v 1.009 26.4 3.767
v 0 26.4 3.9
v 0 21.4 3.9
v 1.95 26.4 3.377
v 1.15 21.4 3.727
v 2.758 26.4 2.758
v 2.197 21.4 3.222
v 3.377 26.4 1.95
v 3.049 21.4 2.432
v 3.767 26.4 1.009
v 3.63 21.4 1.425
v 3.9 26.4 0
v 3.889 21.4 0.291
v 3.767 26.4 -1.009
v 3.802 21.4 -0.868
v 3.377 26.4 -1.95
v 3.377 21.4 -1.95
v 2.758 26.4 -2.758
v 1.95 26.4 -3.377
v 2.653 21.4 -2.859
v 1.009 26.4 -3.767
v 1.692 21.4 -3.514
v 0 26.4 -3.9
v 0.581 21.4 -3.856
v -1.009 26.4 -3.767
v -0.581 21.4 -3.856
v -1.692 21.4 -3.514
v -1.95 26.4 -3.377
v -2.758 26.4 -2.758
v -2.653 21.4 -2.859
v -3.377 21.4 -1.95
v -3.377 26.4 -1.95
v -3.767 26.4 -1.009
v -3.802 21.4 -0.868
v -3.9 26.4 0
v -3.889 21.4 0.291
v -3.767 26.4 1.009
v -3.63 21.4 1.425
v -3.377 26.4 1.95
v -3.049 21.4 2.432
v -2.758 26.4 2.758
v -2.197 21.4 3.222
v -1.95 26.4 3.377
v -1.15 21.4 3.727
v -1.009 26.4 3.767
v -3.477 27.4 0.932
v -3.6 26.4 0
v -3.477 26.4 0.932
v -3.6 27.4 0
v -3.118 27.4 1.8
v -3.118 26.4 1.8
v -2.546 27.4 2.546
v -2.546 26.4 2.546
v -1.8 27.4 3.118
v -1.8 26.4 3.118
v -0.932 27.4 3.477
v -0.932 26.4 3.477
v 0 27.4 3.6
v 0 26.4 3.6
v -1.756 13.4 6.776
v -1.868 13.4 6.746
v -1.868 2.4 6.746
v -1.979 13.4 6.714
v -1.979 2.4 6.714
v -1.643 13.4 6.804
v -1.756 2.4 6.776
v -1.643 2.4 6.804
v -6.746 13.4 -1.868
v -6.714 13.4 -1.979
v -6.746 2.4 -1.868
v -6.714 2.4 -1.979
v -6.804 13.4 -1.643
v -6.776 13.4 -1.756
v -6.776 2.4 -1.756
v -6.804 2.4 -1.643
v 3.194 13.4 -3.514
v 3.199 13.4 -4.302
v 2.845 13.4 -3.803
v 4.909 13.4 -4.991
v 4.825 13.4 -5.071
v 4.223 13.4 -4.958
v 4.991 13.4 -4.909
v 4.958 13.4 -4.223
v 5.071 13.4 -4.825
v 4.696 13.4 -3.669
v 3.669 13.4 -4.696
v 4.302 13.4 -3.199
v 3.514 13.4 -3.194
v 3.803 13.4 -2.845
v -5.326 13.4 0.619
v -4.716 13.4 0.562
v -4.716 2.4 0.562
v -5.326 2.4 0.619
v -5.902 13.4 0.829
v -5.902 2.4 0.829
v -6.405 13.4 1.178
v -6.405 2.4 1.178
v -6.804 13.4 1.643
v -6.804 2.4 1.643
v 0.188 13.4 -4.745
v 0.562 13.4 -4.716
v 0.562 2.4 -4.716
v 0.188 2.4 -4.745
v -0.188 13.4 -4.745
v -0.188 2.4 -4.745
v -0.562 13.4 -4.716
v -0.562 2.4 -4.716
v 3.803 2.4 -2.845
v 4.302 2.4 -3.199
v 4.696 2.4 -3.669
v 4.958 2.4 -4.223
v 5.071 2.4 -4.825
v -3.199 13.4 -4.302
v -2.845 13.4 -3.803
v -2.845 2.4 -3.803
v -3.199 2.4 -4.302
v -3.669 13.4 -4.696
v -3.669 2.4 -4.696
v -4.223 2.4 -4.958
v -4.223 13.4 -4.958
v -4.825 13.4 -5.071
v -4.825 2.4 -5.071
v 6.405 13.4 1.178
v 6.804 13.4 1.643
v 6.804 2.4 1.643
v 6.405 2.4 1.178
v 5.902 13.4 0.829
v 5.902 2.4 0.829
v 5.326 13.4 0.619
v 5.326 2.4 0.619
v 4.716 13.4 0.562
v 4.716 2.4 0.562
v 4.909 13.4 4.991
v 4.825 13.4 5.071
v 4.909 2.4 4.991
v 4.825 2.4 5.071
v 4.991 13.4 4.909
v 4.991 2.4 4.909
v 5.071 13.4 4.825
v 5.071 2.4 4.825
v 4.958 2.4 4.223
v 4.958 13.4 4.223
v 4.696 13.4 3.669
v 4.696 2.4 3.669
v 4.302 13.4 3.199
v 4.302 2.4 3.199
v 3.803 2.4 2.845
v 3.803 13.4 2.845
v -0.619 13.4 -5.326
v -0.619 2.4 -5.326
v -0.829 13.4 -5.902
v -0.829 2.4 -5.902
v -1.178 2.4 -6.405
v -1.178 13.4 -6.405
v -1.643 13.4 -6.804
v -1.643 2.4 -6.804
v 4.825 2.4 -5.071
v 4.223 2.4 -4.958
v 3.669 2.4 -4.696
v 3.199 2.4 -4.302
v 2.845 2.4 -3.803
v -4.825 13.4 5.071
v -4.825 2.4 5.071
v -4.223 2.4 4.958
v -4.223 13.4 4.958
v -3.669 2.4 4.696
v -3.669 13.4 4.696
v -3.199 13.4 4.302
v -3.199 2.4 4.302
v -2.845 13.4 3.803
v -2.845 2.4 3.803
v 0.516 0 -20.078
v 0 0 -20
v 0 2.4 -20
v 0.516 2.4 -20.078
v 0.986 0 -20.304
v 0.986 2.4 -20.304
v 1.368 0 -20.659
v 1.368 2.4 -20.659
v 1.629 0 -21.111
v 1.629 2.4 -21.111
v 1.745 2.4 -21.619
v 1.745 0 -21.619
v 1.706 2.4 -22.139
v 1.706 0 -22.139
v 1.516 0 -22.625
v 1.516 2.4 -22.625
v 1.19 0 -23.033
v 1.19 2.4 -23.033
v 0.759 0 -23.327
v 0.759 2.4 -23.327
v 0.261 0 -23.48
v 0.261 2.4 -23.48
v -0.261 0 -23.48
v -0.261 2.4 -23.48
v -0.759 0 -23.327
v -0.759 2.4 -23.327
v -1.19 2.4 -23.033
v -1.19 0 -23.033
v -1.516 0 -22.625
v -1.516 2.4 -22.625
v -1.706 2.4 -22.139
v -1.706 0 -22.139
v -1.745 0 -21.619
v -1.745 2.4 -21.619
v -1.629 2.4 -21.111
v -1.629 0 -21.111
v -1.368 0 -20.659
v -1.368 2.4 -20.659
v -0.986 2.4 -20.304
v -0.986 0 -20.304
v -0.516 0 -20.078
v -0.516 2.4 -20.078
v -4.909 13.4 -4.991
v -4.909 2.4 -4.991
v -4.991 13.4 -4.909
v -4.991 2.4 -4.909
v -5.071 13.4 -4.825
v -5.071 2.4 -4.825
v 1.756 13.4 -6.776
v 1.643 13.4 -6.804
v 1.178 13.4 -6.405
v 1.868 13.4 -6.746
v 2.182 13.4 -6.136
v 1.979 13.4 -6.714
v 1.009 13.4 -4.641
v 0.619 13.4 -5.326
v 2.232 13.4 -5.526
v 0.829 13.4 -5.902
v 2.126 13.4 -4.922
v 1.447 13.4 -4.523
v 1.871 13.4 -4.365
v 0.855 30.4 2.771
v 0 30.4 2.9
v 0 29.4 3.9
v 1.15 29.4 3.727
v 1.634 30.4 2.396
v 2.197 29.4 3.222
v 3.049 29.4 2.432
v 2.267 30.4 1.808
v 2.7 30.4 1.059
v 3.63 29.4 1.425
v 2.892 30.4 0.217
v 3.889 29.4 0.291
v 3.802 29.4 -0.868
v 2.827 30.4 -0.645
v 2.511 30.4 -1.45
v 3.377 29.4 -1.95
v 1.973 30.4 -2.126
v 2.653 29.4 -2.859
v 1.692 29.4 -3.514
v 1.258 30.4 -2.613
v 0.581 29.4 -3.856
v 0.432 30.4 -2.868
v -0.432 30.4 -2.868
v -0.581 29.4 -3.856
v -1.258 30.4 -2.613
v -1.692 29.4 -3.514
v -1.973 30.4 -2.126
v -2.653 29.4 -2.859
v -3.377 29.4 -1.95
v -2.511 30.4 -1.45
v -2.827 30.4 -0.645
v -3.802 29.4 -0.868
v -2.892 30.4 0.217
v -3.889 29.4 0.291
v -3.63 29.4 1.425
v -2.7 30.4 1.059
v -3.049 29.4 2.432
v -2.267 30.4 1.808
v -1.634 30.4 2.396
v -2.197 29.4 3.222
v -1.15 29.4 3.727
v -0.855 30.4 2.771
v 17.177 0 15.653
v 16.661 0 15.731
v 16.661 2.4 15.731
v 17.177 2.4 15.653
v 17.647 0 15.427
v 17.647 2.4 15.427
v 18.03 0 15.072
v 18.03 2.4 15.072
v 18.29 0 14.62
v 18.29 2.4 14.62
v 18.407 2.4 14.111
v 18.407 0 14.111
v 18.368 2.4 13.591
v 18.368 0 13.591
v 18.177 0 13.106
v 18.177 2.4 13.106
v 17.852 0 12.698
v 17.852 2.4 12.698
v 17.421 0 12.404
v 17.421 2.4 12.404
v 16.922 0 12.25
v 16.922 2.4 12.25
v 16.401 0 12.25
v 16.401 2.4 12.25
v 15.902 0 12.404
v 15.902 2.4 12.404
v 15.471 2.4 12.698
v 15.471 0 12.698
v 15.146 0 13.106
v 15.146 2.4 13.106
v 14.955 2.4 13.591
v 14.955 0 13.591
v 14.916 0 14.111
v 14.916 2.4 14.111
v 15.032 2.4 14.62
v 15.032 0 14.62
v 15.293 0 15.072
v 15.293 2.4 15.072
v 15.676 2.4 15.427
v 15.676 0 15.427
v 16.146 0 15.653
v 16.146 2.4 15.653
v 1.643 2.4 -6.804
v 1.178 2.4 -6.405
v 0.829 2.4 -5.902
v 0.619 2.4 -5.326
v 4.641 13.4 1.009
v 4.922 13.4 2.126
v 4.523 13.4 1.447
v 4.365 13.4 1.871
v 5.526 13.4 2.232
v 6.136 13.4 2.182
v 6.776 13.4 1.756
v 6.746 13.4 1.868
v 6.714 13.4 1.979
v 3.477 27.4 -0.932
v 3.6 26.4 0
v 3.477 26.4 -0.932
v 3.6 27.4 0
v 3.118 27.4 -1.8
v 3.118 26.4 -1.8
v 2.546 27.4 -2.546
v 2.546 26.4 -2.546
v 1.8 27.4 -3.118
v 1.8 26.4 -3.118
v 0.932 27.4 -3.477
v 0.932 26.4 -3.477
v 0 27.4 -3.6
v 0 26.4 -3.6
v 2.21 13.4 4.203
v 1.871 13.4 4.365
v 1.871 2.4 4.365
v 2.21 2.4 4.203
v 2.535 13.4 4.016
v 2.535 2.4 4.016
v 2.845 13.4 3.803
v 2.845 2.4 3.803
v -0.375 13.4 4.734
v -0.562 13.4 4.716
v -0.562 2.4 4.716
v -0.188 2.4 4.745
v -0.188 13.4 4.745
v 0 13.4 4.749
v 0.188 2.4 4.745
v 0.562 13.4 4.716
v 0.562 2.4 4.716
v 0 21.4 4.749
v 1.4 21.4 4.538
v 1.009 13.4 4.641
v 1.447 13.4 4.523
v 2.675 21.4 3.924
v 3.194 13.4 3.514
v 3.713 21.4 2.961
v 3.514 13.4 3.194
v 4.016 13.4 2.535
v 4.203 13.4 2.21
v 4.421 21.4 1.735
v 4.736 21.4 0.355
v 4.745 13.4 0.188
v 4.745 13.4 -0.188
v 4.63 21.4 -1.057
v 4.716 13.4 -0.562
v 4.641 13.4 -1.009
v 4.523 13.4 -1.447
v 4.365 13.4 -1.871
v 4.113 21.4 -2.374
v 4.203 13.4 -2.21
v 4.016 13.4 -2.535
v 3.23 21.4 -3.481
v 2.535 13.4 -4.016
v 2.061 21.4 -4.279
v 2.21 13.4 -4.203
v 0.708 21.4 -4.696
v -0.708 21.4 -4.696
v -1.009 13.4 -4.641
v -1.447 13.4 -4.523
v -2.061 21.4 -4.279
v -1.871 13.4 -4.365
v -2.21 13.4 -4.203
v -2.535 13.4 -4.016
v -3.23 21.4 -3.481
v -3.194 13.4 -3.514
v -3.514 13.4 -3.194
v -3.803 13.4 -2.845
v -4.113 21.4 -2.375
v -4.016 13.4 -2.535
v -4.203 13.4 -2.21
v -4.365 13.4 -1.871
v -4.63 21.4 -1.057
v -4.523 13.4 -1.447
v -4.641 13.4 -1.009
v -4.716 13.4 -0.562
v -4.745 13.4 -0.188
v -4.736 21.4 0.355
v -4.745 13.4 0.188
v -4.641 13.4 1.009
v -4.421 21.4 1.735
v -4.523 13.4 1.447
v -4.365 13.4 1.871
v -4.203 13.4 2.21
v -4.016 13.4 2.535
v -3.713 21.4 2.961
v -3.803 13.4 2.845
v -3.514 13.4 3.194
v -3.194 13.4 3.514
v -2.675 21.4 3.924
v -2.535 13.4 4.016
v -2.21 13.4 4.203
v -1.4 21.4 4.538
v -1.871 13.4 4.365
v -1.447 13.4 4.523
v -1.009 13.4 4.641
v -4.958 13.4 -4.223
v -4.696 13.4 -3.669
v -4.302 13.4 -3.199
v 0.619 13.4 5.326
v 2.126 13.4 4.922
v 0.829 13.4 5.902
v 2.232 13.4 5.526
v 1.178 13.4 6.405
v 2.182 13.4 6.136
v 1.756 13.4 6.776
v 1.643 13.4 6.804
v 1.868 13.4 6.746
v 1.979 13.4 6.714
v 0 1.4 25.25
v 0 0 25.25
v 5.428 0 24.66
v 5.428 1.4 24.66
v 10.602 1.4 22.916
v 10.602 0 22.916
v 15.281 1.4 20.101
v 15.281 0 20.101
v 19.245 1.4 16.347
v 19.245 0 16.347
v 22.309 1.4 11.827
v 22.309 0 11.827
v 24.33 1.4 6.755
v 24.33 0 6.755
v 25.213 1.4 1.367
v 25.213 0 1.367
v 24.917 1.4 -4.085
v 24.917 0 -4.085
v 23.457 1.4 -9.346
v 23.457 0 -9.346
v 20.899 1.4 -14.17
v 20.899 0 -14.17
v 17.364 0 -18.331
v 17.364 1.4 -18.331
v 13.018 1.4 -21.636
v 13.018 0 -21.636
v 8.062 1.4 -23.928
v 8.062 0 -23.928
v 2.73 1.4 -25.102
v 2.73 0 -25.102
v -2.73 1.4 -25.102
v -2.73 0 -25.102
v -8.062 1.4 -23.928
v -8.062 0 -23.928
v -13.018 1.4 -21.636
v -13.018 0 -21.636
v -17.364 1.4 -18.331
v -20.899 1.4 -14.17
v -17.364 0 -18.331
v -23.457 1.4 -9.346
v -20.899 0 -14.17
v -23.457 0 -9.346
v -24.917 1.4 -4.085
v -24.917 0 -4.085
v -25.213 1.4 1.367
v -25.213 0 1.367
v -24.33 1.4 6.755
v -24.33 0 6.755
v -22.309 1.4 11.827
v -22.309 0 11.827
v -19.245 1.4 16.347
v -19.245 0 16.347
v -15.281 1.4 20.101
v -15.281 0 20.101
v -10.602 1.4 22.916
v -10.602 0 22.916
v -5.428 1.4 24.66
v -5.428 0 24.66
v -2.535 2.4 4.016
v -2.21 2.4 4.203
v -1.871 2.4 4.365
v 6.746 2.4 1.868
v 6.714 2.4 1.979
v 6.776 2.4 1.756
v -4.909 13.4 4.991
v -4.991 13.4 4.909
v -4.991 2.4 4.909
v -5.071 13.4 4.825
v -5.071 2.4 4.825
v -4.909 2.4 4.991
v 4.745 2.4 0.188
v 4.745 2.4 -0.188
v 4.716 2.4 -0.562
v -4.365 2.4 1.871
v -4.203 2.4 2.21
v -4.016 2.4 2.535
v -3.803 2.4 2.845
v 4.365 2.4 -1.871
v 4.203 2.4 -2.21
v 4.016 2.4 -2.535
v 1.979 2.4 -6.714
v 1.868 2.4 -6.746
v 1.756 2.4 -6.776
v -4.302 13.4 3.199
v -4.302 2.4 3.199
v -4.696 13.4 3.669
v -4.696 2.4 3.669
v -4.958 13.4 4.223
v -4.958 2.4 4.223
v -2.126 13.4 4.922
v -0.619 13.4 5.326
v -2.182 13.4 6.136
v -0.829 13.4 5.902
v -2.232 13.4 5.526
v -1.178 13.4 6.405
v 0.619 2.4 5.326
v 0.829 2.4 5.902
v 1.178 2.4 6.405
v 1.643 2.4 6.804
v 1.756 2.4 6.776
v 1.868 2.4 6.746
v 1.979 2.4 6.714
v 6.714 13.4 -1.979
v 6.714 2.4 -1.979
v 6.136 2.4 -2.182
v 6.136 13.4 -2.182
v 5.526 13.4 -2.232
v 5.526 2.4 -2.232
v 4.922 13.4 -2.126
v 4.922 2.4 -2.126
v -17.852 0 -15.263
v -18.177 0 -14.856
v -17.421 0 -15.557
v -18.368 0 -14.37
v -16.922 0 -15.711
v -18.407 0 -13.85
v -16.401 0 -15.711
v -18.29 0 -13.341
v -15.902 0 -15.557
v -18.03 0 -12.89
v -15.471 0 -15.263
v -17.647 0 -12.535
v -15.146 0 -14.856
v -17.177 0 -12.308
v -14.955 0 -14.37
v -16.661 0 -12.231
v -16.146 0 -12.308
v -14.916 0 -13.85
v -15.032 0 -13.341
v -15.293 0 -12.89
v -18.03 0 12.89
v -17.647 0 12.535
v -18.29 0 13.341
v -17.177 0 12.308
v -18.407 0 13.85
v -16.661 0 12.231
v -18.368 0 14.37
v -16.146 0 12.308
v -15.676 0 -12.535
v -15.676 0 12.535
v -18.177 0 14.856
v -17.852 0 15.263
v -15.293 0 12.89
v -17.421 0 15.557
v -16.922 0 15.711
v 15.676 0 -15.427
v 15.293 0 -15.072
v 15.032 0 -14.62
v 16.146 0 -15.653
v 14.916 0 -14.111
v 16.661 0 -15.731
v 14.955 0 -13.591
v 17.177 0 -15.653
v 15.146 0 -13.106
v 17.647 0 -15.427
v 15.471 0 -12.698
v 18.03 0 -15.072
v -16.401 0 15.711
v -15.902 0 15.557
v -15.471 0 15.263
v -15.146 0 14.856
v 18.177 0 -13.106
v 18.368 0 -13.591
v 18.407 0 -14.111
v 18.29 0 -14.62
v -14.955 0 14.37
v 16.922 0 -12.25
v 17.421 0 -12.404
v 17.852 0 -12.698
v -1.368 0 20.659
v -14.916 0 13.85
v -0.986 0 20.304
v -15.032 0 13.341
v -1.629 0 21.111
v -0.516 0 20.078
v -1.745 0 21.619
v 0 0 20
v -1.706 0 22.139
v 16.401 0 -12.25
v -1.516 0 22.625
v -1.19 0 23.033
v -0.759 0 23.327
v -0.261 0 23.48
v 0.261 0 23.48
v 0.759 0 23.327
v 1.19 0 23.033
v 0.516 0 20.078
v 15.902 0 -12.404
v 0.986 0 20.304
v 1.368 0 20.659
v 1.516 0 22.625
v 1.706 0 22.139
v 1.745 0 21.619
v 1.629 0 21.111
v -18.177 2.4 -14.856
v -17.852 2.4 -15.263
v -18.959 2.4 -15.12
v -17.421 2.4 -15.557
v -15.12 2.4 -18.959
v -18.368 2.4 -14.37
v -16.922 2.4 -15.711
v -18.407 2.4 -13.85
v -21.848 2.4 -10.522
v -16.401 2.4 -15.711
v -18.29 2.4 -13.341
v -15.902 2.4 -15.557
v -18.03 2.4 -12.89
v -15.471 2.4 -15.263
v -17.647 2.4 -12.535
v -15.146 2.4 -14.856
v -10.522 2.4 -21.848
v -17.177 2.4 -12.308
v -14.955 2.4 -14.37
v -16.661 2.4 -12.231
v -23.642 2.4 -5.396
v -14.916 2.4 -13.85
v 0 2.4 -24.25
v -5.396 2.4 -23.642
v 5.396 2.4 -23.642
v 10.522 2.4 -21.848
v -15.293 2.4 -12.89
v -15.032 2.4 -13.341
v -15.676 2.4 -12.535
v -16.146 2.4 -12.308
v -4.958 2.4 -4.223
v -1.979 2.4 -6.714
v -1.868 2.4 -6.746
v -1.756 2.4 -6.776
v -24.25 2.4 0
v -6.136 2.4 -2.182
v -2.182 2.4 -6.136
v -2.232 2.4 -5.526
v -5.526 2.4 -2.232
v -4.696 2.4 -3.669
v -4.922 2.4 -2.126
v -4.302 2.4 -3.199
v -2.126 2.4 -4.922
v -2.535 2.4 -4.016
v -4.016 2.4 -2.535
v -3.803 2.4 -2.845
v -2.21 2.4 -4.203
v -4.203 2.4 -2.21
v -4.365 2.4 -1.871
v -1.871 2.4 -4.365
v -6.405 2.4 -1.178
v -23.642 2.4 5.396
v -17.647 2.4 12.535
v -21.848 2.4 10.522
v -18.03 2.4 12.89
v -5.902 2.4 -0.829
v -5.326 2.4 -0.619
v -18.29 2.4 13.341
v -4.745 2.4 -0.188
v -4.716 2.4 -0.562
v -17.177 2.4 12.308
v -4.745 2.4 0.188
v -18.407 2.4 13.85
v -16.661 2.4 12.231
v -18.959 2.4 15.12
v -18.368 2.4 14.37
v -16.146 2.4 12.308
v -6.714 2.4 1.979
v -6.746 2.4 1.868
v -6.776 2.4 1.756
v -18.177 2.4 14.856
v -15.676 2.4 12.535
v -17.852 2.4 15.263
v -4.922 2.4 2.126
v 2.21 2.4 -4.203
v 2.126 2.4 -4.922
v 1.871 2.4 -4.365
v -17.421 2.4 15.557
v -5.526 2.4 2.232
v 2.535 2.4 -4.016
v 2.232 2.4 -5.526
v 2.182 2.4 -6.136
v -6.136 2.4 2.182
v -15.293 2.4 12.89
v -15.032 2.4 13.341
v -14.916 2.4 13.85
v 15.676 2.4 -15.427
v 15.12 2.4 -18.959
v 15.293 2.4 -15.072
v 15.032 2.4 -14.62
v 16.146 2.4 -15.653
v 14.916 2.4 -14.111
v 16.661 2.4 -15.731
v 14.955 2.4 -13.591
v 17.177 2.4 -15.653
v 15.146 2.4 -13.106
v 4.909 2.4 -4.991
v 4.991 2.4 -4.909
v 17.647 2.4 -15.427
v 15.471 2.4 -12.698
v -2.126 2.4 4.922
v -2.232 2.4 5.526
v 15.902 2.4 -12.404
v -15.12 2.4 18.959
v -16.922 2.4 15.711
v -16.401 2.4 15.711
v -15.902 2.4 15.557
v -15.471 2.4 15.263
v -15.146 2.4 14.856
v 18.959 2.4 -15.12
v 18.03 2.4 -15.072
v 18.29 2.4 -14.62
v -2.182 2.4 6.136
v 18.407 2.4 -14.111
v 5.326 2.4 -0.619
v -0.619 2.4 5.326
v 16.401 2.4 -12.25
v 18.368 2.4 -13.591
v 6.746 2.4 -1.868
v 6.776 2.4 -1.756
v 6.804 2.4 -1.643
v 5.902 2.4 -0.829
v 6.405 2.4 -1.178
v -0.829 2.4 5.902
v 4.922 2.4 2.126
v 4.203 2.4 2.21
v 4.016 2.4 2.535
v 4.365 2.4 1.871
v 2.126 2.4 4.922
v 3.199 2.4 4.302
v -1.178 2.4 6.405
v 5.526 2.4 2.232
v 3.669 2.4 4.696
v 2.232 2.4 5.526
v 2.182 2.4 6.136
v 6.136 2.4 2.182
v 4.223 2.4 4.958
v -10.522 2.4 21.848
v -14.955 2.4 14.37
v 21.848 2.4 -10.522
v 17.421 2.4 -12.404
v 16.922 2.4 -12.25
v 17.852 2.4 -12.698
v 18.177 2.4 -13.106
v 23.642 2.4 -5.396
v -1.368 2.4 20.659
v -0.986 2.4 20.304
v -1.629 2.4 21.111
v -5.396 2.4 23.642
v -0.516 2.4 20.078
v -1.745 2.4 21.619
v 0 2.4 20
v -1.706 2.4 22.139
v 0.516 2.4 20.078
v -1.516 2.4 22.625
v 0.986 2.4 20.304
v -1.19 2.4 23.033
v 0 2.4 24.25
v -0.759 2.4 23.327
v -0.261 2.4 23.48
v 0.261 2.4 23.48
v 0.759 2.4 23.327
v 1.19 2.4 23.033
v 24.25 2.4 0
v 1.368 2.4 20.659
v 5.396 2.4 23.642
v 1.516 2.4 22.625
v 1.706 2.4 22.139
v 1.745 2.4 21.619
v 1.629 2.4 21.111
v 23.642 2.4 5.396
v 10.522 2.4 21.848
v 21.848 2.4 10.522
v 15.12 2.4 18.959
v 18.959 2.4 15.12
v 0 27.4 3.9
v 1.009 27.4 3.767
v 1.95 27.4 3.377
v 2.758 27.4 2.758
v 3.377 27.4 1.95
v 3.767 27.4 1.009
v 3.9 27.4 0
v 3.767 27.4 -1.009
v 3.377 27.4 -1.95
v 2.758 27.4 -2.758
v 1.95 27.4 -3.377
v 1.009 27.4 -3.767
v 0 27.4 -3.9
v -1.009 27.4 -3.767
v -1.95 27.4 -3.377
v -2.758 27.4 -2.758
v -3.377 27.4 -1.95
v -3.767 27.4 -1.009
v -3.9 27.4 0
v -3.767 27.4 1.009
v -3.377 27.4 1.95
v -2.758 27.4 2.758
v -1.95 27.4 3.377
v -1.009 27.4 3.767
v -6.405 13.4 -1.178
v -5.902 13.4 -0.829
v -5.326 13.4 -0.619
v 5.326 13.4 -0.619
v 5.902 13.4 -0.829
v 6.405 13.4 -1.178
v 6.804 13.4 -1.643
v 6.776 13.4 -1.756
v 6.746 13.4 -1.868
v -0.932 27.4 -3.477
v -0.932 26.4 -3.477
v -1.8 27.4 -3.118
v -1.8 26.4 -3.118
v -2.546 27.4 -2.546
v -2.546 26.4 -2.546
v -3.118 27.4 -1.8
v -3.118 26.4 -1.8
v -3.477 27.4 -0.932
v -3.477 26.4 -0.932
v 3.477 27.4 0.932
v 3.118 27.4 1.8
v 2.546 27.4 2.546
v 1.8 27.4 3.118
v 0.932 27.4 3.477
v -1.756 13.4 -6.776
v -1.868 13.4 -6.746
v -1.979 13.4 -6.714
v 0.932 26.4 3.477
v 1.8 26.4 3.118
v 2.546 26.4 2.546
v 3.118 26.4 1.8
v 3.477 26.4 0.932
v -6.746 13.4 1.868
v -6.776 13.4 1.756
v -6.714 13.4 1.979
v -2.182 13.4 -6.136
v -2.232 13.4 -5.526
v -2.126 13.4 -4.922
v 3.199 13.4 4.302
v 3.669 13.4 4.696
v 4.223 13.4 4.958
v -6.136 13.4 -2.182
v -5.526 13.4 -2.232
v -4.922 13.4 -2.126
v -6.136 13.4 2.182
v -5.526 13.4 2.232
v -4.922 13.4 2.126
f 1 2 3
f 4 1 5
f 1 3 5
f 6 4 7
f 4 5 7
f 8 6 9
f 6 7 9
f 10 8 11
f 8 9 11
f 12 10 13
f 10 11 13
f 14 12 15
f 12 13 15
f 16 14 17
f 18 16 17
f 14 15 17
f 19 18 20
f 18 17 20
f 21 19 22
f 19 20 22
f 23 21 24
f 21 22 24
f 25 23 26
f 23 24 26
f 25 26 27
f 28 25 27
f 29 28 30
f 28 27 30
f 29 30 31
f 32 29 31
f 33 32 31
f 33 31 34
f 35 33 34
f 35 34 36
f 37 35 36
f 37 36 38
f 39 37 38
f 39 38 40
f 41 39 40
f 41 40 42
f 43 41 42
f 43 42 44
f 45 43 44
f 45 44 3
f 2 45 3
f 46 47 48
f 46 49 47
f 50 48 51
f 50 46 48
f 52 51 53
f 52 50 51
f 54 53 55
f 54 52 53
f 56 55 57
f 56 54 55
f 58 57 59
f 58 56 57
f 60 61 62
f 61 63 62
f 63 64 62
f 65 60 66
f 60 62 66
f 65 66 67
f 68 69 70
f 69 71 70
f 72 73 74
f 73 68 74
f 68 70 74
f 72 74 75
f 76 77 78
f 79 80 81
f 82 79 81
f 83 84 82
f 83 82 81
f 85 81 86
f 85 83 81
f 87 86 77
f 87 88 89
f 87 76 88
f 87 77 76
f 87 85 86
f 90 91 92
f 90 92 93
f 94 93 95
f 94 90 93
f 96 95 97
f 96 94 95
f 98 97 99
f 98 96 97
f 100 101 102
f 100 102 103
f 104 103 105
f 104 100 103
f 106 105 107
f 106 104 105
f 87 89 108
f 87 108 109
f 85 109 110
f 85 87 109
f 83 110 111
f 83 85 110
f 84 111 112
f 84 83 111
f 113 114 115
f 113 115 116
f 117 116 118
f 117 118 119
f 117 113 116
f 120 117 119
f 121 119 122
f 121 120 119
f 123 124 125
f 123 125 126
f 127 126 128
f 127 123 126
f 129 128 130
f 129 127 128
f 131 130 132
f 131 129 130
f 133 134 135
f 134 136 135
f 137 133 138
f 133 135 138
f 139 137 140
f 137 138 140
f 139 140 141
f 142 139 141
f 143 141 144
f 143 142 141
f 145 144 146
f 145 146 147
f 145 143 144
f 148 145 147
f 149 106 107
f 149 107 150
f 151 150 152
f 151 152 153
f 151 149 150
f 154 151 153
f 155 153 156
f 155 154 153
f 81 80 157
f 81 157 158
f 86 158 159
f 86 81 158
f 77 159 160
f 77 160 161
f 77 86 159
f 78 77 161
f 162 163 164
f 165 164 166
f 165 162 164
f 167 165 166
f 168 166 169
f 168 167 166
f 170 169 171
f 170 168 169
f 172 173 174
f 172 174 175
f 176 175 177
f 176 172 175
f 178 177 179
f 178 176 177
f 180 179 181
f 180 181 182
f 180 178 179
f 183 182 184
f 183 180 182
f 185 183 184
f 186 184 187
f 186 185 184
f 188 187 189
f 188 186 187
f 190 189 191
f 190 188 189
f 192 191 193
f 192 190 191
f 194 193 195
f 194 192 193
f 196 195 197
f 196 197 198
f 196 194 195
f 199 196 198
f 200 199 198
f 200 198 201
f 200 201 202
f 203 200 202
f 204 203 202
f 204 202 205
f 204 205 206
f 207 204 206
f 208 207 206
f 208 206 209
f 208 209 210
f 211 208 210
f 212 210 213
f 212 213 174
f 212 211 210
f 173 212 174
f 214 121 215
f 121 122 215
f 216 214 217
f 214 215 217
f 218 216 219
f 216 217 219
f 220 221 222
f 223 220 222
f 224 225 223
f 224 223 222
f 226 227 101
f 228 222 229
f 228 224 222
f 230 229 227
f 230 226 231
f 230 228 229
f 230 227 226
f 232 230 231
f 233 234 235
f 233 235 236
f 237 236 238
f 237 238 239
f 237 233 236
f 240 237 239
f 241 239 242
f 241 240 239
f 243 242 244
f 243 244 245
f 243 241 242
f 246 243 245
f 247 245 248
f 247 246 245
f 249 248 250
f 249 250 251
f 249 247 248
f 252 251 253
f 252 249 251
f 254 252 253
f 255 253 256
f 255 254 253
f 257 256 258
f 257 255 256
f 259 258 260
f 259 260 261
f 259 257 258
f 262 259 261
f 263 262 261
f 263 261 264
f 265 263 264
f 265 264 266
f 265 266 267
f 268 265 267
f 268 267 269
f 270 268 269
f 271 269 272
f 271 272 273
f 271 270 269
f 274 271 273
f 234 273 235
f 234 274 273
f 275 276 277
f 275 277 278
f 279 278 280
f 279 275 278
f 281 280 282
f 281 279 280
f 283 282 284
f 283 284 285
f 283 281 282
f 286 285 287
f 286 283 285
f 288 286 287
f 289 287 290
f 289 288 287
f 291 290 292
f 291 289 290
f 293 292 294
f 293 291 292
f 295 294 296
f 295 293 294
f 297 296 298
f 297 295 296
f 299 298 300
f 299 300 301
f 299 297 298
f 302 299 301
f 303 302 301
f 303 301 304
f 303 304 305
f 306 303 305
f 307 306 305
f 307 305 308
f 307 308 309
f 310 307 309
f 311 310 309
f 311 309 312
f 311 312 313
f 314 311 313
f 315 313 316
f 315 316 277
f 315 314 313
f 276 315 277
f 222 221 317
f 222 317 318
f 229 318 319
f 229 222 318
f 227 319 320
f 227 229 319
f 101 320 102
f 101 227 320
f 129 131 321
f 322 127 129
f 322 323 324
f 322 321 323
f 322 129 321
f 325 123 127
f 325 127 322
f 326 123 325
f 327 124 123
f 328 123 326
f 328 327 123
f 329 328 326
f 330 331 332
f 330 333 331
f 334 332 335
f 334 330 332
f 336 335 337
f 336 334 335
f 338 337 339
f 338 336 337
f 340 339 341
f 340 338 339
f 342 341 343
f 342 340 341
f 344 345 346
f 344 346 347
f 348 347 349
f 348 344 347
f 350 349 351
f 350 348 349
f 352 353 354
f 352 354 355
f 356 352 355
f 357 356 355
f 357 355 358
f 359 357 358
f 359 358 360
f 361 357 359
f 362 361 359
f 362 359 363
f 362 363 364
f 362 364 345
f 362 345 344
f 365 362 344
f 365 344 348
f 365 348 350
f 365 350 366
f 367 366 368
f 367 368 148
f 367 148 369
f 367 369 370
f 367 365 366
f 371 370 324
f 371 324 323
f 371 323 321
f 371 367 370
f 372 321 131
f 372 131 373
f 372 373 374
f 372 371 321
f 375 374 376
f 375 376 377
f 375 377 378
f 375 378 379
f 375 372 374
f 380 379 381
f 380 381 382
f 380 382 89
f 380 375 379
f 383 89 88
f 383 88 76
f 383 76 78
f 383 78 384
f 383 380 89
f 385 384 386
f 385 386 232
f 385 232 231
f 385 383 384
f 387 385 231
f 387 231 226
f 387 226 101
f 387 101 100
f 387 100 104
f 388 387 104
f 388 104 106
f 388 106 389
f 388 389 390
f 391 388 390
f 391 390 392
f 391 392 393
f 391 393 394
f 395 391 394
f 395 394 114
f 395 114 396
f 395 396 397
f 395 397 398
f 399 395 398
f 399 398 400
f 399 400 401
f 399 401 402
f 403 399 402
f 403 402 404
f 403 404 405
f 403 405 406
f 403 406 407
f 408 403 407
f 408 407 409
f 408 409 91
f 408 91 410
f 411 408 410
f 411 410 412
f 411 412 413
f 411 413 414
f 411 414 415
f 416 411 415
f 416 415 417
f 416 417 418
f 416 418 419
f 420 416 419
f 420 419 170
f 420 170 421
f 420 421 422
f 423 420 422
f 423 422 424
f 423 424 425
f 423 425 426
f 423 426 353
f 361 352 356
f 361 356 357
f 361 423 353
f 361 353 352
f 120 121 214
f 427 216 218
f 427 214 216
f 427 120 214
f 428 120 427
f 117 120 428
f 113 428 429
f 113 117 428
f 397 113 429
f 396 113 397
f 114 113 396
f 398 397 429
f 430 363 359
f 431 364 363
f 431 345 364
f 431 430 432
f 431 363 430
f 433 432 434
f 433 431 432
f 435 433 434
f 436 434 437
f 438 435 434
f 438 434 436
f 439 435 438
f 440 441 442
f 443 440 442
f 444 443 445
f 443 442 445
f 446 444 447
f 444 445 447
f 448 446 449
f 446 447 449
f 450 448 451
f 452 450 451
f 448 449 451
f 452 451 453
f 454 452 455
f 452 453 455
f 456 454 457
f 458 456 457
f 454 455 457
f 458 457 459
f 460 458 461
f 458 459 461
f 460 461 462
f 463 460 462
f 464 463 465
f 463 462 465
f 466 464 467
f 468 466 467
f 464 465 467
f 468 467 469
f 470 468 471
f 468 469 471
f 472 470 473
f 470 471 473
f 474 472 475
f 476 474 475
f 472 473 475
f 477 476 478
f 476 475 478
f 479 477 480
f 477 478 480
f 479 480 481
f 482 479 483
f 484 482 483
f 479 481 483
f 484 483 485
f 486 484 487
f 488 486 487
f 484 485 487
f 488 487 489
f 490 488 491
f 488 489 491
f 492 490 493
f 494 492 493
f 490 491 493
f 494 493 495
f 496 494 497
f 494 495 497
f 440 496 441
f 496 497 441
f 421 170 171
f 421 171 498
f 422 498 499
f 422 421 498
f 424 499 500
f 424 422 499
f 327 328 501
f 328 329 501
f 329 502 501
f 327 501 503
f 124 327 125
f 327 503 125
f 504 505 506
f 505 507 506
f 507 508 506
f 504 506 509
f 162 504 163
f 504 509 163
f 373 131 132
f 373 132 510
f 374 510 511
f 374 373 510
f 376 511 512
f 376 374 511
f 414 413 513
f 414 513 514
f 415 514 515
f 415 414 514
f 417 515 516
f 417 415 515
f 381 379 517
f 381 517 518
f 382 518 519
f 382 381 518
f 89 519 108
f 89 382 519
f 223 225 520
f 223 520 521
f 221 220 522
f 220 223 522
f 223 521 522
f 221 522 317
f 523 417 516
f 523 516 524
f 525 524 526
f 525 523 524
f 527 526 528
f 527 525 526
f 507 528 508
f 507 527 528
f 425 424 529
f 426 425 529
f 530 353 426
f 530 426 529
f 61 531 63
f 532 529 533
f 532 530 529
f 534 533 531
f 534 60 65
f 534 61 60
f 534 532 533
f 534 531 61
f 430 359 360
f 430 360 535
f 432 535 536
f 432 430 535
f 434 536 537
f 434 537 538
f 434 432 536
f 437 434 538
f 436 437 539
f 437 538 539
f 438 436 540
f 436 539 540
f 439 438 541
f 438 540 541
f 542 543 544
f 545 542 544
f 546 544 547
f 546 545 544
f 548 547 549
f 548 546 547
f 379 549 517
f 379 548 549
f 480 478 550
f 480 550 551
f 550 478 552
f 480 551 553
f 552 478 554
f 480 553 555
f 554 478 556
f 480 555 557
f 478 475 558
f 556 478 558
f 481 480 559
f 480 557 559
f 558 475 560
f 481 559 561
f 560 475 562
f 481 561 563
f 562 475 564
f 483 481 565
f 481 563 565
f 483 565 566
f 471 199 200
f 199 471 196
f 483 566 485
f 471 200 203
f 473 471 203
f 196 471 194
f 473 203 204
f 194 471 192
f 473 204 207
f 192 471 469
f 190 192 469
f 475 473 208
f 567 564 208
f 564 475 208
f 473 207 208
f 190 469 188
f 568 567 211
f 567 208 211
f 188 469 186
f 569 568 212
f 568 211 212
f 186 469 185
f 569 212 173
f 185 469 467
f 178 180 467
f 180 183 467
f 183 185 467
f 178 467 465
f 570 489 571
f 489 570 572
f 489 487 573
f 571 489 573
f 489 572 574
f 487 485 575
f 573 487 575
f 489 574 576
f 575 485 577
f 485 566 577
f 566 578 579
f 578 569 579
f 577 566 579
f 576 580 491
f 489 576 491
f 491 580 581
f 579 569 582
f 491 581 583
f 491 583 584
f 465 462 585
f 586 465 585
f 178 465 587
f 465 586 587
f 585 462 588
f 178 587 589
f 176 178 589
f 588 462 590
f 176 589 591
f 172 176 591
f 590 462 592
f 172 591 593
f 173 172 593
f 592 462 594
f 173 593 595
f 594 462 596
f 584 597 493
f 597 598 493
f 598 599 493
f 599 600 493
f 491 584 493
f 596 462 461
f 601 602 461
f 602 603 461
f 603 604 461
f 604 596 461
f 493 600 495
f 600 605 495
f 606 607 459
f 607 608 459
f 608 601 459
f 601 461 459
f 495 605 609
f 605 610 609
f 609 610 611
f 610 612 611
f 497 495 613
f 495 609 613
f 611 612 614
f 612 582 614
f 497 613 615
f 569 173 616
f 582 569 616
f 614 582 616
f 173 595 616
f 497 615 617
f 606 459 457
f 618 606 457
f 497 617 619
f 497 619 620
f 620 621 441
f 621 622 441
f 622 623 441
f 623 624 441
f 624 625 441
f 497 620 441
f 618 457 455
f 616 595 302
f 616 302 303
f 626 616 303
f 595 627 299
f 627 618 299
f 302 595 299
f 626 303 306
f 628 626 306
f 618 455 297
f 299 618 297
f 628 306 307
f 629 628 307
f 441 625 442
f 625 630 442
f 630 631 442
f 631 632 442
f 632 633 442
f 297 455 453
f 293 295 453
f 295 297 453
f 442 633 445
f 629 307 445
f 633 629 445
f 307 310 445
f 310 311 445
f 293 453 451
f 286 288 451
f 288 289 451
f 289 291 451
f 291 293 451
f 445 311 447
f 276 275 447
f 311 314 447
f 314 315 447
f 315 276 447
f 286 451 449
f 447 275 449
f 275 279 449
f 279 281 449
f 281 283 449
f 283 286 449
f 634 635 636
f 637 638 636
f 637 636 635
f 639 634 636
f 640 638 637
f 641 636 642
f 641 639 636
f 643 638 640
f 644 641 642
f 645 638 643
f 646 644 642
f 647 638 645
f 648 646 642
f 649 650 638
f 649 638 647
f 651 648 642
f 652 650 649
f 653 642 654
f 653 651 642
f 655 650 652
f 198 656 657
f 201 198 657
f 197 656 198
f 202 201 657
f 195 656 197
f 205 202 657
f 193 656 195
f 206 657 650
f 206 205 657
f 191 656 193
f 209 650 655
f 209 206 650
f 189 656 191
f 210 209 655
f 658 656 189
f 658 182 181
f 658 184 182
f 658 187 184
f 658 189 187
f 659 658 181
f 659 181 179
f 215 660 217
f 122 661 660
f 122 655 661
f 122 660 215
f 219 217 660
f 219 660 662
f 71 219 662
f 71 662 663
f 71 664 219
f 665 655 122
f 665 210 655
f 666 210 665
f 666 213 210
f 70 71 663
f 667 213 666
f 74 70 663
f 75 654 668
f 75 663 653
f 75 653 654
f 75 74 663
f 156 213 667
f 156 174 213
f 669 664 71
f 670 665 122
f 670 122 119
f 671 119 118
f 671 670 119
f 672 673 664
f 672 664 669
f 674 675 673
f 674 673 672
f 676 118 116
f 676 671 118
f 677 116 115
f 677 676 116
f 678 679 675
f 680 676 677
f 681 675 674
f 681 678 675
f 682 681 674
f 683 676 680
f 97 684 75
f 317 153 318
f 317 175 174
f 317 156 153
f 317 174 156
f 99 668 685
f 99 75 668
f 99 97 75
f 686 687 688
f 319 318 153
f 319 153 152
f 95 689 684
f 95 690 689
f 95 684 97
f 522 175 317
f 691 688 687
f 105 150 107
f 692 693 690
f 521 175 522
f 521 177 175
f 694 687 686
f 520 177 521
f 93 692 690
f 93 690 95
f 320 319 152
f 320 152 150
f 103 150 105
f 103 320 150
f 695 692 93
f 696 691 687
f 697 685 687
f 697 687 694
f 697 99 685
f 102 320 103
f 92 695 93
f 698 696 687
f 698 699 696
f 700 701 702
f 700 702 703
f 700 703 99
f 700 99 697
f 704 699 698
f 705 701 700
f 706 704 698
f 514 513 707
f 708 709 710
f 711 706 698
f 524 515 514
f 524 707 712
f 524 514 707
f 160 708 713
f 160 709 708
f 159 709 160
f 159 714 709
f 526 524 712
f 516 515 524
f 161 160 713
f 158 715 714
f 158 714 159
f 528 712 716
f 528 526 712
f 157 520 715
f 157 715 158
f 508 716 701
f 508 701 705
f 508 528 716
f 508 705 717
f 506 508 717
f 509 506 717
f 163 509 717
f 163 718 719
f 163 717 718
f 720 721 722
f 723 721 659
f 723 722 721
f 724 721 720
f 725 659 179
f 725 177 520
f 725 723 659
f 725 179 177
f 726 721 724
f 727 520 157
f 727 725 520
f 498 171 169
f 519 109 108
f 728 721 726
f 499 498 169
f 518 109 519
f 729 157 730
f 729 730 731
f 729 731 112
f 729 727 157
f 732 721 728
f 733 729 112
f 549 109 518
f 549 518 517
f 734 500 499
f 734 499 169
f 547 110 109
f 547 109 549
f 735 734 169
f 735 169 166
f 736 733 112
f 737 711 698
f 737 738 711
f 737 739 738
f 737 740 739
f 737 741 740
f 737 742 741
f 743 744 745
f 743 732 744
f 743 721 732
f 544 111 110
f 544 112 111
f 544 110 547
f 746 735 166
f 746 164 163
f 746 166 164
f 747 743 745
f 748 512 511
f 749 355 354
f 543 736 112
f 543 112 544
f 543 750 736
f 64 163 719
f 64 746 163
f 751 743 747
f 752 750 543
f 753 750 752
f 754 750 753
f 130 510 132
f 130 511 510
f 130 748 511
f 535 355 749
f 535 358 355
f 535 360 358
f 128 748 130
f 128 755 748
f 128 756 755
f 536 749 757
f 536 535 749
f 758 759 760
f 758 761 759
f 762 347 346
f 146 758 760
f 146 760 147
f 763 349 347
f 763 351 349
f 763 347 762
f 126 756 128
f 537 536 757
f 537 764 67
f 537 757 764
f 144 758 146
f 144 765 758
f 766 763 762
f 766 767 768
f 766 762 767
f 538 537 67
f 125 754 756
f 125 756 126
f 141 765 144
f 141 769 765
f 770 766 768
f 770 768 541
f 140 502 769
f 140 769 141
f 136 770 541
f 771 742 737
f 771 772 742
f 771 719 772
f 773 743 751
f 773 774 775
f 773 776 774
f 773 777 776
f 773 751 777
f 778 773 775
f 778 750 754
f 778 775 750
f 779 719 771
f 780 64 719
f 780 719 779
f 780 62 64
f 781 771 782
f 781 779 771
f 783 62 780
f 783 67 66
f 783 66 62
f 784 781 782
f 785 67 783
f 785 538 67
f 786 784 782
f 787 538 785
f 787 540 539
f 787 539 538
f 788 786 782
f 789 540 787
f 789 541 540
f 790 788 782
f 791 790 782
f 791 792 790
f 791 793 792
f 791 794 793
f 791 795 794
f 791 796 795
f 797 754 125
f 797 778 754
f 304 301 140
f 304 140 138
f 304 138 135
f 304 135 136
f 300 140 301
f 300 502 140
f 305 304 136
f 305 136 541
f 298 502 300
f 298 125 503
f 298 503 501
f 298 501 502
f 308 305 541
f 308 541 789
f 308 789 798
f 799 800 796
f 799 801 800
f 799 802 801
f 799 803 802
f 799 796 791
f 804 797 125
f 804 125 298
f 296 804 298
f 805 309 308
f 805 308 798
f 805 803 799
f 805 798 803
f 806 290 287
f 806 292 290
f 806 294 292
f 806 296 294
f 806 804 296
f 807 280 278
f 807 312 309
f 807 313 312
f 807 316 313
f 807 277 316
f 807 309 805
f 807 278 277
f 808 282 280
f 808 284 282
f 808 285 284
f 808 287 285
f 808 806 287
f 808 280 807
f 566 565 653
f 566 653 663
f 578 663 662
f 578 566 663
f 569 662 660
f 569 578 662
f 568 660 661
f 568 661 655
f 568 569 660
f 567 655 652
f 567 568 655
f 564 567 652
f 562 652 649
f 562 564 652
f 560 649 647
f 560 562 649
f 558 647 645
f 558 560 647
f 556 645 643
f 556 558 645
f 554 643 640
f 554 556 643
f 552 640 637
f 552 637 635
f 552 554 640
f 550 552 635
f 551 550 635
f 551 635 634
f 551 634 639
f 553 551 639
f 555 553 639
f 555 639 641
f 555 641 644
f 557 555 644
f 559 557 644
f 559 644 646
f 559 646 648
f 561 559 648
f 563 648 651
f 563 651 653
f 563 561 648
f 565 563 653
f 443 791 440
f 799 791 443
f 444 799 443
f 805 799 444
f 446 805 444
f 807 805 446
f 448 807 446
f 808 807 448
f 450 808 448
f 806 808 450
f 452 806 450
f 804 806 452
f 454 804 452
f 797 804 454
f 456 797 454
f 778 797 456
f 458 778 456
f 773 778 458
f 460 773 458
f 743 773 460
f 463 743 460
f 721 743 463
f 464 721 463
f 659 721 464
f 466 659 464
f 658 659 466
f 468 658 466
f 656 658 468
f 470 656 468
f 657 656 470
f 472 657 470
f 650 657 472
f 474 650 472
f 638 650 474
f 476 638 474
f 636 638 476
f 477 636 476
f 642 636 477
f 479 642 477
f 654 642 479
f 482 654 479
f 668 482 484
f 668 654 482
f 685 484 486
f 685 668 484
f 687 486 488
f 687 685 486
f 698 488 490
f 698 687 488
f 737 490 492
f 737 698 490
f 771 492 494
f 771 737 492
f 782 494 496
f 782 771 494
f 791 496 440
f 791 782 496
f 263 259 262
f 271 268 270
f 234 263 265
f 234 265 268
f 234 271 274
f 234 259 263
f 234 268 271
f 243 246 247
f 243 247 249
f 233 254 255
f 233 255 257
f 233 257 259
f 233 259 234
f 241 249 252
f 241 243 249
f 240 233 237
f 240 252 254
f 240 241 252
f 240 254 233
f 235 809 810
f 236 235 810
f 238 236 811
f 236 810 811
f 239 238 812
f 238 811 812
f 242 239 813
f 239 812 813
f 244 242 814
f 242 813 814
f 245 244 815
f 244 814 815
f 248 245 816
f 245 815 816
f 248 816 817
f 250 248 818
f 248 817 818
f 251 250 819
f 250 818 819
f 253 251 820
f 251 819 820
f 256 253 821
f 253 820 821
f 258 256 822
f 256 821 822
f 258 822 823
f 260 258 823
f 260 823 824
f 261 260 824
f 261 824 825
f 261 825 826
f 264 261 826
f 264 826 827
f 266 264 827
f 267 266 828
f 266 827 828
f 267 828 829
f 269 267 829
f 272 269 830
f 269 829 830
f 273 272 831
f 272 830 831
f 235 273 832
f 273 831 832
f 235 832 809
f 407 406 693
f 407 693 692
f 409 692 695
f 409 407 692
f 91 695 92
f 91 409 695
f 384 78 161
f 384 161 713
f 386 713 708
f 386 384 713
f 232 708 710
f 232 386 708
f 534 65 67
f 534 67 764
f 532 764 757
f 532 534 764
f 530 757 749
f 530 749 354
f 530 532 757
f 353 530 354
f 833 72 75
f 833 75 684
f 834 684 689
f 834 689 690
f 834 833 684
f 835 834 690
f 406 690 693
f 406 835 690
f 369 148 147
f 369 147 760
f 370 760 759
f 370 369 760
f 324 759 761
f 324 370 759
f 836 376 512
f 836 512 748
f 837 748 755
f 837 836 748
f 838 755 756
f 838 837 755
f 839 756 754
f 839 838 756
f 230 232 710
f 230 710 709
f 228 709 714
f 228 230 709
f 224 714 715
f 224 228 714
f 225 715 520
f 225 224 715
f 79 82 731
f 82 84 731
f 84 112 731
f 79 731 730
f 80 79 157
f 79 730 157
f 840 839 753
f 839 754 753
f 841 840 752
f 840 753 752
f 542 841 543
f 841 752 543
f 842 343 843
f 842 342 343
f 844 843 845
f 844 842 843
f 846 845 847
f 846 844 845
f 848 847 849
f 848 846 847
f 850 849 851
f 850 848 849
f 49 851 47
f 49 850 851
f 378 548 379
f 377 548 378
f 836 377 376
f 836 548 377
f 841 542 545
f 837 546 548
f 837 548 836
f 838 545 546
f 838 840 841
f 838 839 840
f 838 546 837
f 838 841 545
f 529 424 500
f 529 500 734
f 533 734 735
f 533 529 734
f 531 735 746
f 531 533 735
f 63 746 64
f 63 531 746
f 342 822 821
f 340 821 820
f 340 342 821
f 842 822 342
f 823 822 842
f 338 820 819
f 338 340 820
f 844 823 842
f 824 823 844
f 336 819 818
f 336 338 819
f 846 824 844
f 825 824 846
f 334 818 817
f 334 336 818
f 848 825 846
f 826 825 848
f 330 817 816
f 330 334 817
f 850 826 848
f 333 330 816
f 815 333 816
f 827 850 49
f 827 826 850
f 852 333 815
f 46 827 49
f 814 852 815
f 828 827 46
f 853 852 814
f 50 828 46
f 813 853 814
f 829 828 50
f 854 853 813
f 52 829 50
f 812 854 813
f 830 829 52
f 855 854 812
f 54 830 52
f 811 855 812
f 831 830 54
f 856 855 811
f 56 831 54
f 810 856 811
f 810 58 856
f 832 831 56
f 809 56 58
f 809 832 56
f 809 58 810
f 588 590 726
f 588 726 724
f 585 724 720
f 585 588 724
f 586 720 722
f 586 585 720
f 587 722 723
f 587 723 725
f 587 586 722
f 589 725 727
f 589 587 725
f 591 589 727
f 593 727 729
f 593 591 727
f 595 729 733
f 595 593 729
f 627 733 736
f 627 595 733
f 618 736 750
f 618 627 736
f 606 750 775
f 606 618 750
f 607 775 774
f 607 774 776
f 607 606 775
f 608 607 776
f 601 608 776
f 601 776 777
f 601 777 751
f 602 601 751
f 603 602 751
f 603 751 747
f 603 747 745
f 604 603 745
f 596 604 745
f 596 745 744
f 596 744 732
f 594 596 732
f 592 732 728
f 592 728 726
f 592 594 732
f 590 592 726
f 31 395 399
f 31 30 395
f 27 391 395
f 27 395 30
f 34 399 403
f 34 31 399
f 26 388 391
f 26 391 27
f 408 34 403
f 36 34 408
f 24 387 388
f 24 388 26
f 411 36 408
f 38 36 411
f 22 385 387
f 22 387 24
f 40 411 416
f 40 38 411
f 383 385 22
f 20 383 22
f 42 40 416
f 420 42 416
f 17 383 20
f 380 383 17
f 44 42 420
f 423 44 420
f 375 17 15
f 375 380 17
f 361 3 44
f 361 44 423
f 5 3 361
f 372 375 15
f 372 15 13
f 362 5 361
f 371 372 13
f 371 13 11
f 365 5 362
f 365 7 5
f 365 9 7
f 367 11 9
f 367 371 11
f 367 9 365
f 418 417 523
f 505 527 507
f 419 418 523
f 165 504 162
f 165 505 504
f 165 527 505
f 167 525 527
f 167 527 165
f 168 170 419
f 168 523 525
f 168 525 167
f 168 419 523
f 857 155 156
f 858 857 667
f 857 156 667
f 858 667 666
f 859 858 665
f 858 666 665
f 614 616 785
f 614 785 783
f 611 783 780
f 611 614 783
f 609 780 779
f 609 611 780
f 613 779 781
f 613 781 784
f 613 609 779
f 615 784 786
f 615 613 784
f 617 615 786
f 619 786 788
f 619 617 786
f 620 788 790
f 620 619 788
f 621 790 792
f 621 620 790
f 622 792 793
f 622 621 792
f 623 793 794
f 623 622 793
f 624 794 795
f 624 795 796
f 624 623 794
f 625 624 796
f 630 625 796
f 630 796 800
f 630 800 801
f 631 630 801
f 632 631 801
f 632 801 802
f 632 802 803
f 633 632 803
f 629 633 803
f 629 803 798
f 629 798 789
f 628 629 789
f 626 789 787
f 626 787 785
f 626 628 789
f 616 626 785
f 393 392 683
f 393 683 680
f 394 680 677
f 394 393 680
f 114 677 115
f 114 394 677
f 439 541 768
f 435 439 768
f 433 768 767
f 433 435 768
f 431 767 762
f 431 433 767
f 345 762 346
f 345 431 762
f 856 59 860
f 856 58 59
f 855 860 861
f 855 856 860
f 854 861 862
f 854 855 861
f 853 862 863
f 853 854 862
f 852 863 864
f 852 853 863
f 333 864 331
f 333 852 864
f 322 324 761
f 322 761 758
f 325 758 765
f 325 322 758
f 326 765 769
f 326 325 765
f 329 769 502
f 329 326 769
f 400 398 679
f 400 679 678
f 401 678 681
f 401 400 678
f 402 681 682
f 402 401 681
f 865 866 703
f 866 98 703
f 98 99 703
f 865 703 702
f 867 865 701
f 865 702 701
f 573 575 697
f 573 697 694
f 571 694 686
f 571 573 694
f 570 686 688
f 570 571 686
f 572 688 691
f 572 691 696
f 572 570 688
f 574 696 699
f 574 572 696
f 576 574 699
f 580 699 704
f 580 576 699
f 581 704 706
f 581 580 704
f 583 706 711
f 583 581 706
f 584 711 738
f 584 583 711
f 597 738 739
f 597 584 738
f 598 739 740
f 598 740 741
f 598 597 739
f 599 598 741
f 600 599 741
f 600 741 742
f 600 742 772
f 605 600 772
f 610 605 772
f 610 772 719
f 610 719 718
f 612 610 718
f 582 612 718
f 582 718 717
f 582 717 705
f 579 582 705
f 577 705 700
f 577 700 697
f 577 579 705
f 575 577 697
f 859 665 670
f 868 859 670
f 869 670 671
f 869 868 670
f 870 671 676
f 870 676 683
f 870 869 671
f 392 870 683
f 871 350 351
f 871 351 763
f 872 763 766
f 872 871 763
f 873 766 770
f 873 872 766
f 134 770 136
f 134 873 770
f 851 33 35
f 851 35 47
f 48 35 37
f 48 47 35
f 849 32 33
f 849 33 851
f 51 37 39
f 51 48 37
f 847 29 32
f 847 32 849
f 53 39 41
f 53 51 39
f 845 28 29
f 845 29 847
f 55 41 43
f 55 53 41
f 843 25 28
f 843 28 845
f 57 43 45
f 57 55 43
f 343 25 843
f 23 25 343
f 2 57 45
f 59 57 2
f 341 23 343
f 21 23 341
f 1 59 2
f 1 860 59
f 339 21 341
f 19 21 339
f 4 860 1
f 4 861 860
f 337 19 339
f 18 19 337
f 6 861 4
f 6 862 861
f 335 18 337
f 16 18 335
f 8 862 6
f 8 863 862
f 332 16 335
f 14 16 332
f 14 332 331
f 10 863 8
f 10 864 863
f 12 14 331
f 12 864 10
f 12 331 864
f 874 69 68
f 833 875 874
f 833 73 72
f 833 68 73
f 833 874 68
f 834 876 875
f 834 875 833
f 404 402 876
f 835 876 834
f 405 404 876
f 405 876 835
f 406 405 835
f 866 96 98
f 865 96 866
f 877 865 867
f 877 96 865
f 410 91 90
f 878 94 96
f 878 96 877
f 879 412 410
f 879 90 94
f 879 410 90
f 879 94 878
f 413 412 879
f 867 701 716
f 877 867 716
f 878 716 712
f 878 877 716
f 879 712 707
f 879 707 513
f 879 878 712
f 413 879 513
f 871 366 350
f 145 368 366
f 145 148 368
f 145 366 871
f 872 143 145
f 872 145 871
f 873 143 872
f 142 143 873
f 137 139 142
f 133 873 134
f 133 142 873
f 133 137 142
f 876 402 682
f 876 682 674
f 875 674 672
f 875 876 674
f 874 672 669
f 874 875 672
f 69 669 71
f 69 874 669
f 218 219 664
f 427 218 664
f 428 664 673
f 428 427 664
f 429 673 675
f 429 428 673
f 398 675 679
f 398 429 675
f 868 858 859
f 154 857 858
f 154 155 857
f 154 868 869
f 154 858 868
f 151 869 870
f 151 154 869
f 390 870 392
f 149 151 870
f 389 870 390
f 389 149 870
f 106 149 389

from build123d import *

# Parameters (mm, degrees)
SKETCH1_R           = 25.25
SKETCH1_R_2         = 1.75
BOSS_EXTRUDE1_DEPTH = 2.4
SKETCH3_R           = 7
BOSS_EXTRUDE3_DEPTH = 11
CUT_EXTRUDE1_DEPTH  = 11
CIRPATTERN1_COUNT   = 12
CHAMFER1_SIZE       = 1
BOSS_EXTRUDE4_START = 8
SKETCH6_R           = 4.749
BOSS_EXTRUDE4_DEPTH = 8
BOSS_EXTRUDE5_START = 8
SKETCH6_3_R         = 3.9
BOSS_EXTRUDE5_DEPTH = 9
CHAMFER2_SIZE       = 1
SKETCH7_W           = 0.3
SKETCH7_H           = 1


with BuildPart() as part:
    # Sketch1 → Boss-Extrude1 (new body)
    with BuildSketch(Plane(origin=(0, 0, 0), x_dir=(1, 0, 0), z_dir=(0, 1, 0))):
        with Locations(Location((0, 0, 0), (0, 0, 270))):
            Circle(SKETCH1_R)
        with Locations(Location((0, 21.75, 0), (0, 0, 270))):
            Circle(SKETCH1_R_2, mode=Mode.SUBTRACT)
        with Locations(Location((-16.661466638, 13.980630511, 0), (0, 0, 270))):
            Circle(SKETCH1_R_2, mode=Mode.SUBTRACT)
        with Locations(Location((16.661466638, 13.980630511, 0), (0, 0, 90))):
            Circle(SKETCH1_R_2, mode=Mode.SUBTRACT)
        with Locations(Location((16.661466638, -13.980630511, 0), (0, 0, 270))):
            Circle(SKETCH1_R_2, mode=Mode.SUBTRACT)
        with Locations(Location((0, -21.75, 0), (0, 0, 90))):
            Circle(SKETCH1_R_2, mode=Mode.SUBTRACT)
        with Locations(Location((-16.661466638, -13.980630511, 0), (0, 0, 90))):
            Circle(SKETCH1_R_2, mode=Mode.SUBTRACT)
    extrude(amount=BOSS_EXTRUDE1_DEPTH)

    # Sketch3 → Boss-Extrude3 (add)
    with BuildSketch(Plane(origin=(0, 2.4, 0), x_dir=(1, 0, 0), z_dir=(0, 1, 0))):
        with Locations(Location((0, 0, 0), (0, 0, 270))):
            Circle(SKETCH3_R)
    extrude(amount=BOSS_EXTRUDE3_DEPTH)

    # Sketch4 → Cut-Extrude1 (cut)
    with BuildSketch(Plane(origin=(0, 13.4, 0), x_dir=(1, 0, 0), z_dir=(0, 1, 0))):
        with BuildLine():
            ThreePointArc((0.562207301, 4.715604304), (0, 4.749), (-0.562207301, 4.715604304))
            ThreePointArc((-0.562207301, 4.715604304), (-0.837528627, 5.917009812), (-1.672850686, 6.823328788))
            ThreePointArc((-1.672850686, 6.823328788), (0, 7.0254), (1.672850686, 6.823328788))
            ThreePointArc((1.672850686, 6.823328788), (0.837528627, 5.917009812), (0.562207301, 4.715604304))
        make_face()
    cut_extrude1 = extrude(amount=-CUT_EXTRUDE1_DEPTH, mode=Mode.SUBTRACT)

    # CirPattern1: Cut-Extrude1 ×12 about axis
    cirpattern1_axis = Axis((0, 0, 0), (0, 1, 0))
    for i in range(1, CIRPATTERN1_COUNT):
        add(cut_extrude1.rotate(cirpattern1_axis, i * 360 / CIRPATTERN1_COUNT), mode=Mode.SUBTRACT)

    # Chamfer1
    chamfer1_edges = [part.edges().sort_by_distance(p)[0] for p in [
        (0, 2.4, -25.25),
    ]]
    chamfer(chamfer1_edges, length=CHAMFER1_SIZE)

    # Sketch6 → Boss-Extrude4 (add)
    with BuildSketch(Plane(origin=(0, 13.4, 0), x_dir=(1, 0, 0), z_dir=(0, 1, 0)).offset(BOSS_EXTRUDE4_START)):
        with Locations(Location((0, 0, 0), (0, 0, 270))):
            Circle(SKETCH6_R)
    extrude(amount=-BOSS_EXTRUDE4_DEPTH)

    # Sketch6<3> → Boss-Extrude5 (add)
    with BuildSketch(Plane(origin=(0, 13.4, 0), x_dir=(1, 0, 0), z_dir=(0, 1, 0)).offset(BOSS_EXTRUDE5_START)):
        with Locations(Location((0, 0, 0), (0, 0, 270))):
            Circle(SKETCH6_3_R)
    extrude(amount=BOSS_EXTRUDE5_DEPTH)

    # Chamfer2
    chamfer2_edges = [part.edges().sort_by_distance(p)[0] for p in [
        (0, 30.4, -3.9),
    ]]
    chamfer(chamfer2_edges, length=CHAMFER2_SIZE)

    # Cut-Sweep1: sweep along a curve in space
    with BuildLine() as cut_sweep1_path:
        ThreePointArc((0, 29.4, 3.9), (2.757716447, 29.4, 2.757716447), (3.9, 29.4, 0))
        ThreePointArc((3.9, 29.4, 0), (2.757716447, 29.4, -2.757716447), (0, 29.4, -3.9))
        ThreePointArc((0, 29.4, -3.9), (-2.757716447, 29.4, -2.757716447), (-3.9, 29.4, 0))
        ThreePointArc((-3.9, 29.4, 0), (-2.757716447, 29.4, 2.757716447), (0, 29.4, 3.9))
    # Sketch7 → Cut-Sweep1 (sweep, cut)
    with BuildSketch(Plane.XY):
        with Locations((-3.75, 26.9)):
            Rectangle(SKETCH7_W, SKETCH7_H)
    sweep(path=cut_sweep1_path.line, mode=Mode.SUBTRACT)


solid = part.part
